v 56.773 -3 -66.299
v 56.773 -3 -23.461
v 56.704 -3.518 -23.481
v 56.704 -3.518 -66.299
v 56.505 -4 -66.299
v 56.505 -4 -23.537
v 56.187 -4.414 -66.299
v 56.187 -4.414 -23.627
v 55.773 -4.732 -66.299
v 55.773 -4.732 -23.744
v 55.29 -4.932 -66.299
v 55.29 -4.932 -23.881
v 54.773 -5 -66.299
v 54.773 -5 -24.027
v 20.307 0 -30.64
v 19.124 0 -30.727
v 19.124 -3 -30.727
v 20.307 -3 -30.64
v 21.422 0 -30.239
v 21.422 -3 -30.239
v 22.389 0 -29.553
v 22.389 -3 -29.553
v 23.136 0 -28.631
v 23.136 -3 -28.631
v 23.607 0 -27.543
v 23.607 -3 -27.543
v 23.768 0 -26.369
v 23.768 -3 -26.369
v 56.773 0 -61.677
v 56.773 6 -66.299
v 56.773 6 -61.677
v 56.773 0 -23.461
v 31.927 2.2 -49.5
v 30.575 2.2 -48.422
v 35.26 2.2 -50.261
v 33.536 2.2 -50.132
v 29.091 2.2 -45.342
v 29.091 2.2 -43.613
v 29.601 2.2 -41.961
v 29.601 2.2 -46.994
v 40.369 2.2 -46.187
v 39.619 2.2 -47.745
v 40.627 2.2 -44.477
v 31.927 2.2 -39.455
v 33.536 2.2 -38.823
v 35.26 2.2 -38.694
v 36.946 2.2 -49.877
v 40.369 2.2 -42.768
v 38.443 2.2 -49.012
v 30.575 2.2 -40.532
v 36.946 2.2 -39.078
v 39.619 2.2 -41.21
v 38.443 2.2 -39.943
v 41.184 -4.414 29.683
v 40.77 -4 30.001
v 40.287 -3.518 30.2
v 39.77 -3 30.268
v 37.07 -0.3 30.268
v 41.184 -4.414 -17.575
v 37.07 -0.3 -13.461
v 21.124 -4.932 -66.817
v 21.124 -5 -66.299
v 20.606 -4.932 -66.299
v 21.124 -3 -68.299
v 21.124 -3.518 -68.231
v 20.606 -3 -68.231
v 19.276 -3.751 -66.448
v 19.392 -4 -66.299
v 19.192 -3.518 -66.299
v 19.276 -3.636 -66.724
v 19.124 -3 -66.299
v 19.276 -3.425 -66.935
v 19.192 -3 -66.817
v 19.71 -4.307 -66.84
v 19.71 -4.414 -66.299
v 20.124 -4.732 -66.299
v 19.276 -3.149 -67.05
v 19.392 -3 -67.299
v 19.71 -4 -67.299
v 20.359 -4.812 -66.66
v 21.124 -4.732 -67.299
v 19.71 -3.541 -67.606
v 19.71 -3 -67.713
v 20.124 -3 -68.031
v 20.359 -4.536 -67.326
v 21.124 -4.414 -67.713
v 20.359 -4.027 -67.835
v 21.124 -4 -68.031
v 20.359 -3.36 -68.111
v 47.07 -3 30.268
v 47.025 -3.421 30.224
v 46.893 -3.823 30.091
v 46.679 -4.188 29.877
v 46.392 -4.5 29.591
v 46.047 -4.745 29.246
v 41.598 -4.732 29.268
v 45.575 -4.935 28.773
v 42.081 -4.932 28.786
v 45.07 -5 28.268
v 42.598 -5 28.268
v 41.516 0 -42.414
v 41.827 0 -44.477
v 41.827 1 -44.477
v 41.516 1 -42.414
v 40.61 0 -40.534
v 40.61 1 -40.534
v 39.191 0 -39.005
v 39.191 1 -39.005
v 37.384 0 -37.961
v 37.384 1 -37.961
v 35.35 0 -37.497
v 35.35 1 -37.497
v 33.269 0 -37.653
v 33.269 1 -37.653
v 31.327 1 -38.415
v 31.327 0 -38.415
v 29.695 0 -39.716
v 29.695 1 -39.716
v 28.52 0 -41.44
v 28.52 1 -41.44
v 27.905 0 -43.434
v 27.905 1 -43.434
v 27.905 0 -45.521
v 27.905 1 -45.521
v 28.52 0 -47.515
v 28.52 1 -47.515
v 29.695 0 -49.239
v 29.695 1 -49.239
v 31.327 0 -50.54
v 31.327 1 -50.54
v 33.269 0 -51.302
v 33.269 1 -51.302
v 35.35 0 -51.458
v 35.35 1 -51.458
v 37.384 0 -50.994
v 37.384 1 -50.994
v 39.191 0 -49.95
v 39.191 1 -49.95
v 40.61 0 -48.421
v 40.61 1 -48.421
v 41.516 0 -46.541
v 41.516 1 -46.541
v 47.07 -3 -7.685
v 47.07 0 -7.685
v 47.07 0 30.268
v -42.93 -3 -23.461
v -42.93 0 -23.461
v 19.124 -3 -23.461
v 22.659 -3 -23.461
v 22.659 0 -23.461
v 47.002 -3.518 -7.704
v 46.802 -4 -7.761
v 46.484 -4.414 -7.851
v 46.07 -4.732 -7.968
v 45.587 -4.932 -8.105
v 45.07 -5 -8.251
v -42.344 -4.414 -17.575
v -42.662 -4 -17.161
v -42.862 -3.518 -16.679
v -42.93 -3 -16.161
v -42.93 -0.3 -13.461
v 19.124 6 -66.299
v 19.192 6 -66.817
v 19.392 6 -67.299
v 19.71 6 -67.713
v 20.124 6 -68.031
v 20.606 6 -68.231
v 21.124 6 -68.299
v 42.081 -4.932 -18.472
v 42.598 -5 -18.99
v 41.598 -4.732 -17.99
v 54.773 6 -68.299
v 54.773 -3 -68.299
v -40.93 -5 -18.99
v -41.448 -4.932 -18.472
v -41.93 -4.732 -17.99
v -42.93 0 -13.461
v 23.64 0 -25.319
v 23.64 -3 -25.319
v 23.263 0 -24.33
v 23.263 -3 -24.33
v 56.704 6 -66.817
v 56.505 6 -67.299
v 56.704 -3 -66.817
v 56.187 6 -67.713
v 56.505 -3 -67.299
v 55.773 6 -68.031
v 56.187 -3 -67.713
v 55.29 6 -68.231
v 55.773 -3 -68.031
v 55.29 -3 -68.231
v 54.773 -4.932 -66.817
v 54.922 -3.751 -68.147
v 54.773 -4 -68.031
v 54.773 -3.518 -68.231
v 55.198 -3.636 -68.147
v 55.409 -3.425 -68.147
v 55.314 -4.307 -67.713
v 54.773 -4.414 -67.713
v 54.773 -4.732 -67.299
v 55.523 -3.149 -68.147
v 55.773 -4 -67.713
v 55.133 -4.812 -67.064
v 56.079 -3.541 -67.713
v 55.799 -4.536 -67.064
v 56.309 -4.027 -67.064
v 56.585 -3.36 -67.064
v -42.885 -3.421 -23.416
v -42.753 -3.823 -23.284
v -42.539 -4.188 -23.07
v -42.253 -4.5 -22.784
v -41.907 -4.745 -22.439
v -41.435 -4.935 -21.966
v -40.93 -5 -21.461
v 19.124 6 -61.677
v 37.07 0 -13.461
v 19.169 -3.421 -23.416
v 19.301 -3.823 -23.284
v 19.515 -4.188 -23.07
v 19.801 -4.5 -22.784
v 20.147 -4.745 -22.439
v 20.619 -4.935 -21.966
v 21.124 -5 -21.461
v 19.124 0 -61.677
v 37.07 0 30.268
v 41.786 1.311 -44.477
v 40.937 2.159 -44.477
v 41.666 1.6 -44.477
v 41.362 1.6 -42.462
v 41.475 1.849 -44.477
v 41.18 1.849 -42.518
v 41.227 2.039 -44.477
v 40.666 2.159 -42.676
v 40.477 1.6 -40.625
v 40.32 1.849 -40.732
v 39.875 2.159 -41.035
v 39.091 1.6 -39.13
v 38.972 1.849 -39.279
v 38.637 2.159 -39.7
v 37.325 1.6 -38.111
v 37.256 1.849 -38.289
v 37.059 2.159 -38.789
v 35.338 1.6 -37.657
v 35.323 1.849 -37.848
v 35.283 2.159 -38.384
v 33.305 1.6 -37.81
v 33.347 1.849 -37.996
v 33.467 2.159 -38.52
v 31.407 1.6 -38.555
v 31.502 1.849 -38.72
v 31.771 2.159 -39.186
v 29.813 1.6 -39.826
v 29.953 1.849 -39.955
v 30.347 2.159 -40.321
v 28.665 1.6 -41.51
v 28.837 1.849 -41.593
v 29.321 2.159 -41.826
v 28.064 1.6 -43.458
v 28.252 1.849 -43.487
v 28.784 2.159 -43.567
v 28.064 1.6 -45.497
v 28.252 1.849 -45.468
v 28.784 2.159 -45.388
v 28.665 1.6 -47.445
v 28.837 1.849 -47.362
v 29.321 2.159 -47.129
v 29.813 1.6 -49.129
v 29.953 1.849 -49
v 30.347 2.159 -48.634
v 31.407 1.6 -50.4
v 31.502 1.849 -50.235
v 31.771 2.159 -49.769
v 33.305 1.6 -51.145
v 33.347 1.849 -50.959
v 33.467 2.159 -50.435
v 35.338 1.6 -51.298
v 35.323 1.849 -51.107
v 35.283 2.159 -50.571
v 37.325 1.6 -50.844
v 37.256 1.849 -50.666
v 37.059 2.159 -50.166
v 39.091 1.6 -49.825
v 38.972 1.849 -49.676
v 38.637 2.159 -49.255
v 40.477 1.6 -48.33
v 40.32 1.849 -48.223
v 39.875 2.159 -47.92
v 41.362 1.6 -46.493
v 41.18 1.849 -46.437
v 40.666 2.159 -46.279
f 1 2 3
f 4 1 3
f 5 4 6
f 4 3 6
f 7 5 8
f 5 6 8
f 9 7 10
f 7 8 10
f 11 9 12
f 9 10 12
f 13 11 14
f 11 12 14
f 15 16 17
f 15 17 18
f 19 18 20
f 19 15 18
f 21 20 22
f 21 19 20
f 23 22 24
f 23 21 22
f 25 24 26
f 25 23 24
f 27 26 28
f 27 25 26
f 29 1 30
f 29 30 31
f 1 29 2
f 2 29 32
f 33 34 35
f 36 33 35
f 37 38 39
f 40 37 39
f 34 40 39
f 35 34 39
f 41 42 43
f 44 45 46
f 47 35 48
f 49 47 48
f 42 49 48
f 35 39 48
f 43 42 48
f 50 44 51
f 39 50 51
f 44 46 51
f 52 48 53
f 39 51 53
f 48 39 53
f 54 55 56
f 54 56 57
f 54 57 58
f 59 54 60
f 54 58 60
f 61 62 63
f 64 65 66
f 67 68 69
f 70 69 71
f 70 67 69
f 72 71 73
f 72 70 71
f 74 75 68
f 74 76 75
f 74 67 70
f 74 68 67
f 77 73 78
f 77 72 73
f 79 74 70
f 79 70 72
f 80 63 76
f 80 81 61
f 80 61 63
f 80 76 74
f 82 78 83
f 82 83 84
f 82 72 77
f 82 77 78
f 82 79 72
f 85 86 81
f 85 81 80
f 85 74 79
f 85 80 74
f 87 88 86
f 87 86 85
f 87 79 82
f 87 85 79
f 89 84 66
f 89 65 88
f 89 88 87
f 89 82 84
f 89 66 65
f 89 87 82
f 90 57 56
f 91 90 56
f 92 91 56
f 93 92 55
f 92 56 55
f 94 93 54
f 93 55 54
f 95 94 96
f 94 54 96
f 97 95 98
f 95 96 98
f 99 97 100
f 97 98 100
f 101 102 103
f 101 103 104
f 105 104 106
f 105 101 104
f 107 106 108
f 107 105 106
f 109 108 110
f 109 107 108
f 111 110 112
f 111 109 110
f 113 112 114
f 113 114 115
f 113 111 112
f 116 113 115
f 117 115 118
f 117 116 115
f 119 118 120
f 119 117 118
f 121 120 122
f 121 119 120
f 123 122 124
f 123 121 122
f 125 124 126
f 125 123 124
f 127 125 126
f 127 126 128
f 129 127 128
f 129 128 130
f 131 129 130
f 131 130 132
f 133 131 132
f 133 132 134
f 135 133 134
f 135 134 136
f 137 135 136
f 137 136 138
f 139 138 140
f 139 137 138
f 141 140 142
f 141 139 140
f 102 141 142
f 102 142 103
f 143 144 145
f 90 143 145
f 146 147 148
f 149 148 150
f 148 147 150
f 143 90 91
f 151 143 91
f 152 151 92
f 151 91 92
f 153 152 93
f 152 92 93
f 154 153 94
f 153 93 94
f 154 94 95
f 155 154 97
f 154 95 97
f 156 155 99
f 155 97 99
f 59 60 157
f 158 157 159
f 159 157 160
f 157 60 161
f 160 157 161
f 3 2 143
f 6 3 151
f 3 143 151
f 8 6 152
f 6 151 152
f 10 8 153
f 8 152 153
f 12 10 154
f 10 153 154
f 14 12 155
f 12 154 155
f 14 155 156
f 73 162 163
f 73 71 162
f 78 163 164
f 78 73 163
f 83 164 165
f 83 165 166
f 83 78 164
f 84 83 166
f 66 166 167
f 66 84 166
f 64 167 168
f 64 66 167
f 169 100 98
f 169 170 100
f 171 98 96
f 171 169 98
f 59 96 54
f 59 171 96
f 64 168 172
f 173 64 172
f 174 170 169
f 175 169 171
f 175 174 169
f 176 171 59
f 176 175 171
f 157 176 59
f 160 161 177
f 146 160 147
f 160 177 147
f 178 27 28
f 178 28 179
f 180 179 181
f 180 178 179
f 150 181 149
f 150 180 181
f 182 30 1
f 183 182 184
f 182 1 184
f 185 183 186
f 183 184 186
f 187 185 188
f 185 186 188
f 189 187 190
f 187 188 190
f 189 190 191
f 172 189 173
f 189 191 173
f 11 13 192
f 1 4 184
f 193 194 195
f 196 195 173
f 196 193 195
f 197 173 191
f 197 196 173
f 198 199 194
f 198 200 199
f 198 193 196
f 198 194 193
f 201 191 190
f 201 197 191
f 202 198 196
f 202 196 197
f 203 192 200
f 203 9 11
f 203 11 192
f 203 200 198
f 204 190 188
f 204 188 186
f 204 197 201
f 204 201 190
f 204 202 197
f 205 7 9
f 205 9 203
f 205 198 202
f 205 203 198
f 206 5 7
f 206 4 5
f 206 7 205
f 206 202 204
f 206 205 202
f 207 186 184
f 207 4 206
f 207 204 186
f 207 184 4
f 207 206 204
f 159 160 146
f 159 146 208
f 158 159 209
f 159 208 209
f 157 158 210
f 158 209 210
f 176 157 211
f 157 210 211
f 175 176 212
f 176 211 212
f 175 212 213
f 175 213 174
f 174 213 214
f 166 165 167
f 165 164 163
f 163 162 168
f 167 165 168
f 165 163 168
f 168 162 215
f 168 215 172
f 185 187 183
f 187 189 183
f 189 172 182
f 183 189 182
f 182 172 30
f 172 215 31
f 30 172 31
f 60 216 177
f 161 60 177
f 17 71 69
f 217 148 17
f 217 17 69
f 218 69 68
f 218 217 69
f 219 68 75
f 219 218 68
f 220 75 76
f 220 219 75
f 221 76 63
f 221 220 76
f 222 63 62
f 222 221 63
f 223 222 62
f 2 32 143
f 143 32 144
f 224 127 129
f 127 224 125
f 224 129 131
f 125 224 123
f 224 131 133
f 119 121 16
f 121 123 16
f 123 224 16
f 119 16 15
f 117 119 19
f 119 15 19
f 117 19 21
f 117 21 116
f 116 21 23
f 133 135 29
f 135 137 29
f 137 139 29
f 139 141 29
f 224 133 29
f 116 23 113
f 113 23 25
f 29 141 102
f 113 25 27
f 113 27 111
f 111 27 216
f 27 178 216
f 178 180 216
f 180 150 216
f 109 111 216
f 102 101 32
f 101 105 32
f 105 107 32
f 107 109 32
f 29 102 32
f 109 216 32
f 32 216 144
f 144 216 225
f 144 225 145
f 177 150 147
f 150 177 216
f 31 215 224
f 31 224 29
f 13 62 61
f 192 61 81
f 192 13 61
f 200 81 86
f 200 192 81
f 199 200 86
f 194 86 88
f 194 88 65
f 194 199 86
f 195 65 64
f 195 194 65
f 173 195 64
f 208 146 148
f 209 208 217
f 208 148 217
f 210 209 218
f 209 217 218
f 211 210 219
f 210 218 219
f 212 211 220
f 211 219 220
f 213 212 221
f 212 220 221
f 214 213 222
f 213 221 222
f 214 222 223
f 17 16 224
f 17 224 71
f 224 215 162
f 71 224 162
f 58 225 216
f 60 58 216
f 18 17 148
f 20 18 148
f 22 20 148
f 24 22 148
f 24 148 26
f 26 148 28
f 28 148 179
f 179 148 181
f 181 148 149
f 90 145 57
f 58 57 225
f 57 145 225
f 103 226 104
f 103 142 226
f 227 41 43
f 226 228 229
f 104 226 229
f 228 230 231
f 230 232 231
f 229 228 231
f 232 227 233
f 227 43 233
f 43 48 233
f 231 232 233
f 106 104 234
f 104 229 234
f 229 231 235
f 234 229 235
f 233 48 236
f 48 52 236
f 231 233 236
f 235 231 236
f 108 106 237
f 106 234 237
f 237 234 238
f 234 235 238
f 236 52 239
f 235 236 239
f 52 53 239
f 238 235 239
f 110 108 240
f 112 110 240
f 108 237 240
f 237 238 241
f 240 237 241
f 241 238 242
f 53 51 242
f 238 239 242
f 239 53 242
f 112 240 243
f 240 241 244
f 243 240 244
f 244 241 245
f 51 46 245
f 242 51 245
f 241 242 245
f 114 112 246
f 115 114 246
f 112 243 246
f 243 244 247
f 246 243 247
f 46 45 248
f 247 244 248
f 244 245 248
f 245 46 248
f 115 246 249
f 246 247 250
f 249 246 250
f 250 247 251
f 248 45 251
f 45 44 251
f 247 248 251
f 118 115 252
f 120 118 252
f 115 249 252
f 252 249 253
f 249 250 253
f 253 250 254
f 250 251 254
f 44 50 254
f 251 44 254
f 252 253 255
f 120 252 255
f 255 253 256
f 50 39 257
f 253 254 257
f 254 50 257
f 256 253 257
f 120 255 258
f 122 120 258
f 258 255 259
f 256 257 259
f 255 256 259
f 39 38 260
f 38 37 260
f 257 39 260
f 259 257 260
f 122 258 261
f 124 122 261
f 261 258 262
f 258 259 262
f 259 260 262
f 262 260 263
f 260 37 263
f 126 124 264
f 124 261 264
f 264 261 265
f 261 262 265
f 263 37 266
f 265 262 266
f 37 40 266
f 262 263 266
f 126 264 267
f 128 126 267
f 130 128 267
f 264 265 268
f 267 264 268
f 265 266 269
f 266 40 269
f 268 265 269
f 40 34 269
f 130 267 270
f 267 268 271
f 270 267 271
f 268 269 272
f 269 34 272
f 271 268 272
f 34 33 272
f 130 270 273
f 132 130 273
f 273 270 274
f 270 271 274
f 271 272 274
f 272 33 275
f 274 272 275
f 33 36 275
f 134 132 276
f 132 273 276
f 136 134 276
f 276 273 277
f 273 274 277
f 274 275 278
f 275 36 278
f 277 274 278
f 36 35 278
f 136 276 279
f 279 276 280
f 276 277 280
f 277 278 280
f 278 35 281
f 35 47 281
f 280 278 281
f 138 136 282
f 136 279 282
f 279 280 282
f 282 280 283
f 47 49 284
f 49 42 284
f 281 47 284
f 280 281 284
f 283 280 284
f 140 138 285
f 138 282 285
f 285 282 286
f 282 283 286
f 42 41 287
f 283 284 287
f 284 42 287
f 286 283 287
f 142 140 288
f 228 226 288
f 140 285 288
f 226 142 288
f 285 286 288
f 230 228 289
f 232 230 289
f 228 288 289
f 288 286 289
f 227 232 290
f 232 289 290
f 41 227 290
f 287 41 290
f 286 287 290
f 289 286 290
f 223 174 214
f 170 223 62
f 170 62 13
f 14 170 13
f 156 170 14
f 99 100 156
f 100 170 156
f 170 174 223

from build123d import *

# Parameters (mm, degrees)
F0_W          = 37.648660762
F0_H          = 6.6216221157
F1_DEPTH      = 6
F1_DEPTH_BACK = 5
F0_R          = 7
F2_DEPTH      = 5
F3_DEPTH      = 2.2
F4_SIZE       = 4.7
F5_R          = 1.2
F6_R          = 2
F8_DEPTH      = 2
F8_DEPTH_BACK = 3


with BuildPart() as f1:
    # F0 (on Front) → F1 (new body, two sides)
    with BuildSketch(Plane.XZ) as f1_sk:
        with Locations((37.9482610798, -64.9883002128)):
            Rectangle(F0_W, F0_H)
    extrude(amount=-F1_DEPTH)
    extrude(f1_sk.sketch, amount=F1_DEPTH_BACK)

    # F0 (on Front) → F2 (join)
    with BuildSketch(Plane.XZ):
        Polygon((19.1239306988, -23.4612585763), (19.1239306988, -61.677489155), (56.7725914607, -61.677489155), (56.7725914607, -23.4612585763), (47.0698534062, -23.4612585763), (37.0698534062, -23.4612585763), align=None)
        with Locations((34.8266364816, -44.477489155)):
            Circle(F0_R, mode=Mode.SUBTRACT)
        Polygon((-42.9301465938, -23.4612585763), (19.1239306988, -23.4612585763), (37.0698534062, -23.4612585763), (37.0698534062, -13.4612585763), (-42.9301465938, -13.4612585763), align=None)
        Polygon((37.0698534062, -13.4612585763), (37.0698534062, -23.4612585763), (47.0698534062, -23.4612585763), (47.0698534062, -7.6851719059), (47.0698534062, 30.268489238), (37.0698534062, 30.268489238), align=None)
        with Locations((34.8266364816, -44.477489155)):
            Circle(F0_R)
        Polygon((47.0698534062, -23.4612585763), (56.7725914607, -23.4612585763), (47.0698534062, -7.6851719059), align=None)
    extrude(amount=F2_DEPTH)

    # F0 (on Front) → F3 (join)
    with BuildSketch(Plane.XZ):
        with Locations((34.8266364816, -44.477489155)):
            Circle(F0_R)
    extrude(amount=-F3_DEPTH)

    # F4
    f4_edges = [f1.edges().sort_by_distance(p)[0] for p in [
        (-2.930147, -5, -13.461259),
        (37.069853, -5, 8.403615),
    ]]
    chamfer(f4_edges, length=F4_SIZE)

    # F5
    f5_edges = [f1.edges().sort_by_distance(p)[0] for p in [
        (27.826636, 2.2, -44.477489),
    ]]
    fillet(f5_edges, radius=F5_R)

    # F6
    f6_edges = [f1.edges().sort_by_distance(p)[0] for p in [
        (51.921222, -5, -15.573215),
        (47.069853, -5, 11.291659),
        (56.772591, -5, -45.880185),
        (37.948261, -5, -68.299111),
        (44.419853, -5, 30.268489),
        (41.769853, -5, 6.053615),
        (-0.580147, -5, -18.161259),
        (-42.930147, -5, -20.811259),
        (-11.903108, -5, -23.461259),
        (19.123931, -5, -45.880185),
        (19.123931, 0.5, -68.299111),
        (56.772591, 0.5, -68.299111),
    ]]
    fillet(f6_edges, radius=F6_R)

    # F7 (on face) → F8 (cut, two sides)
    with BuildSketch(Plane.XZ) as f8_sk:
        with BuildLine():
            ThreePointArc((19.1239306988, -30.7265526876), (22.3891362533, -29.5527672873), (23.7676569653, -26.3685844839))
            ThreePointArc((23.7676569653, -26.3685844839), (23.4811232341, -24.8128381171), (22.6591250093, -23.4612585763))
            Line((22.6591250093, -23.4612585763), (19.1239306988, -23.4612585763))
            Line((19.1239306988, -23.4612585763), (19.1239306988, -30.7265526876))
        make_face()
    extrude(amount=-F8_DEPTH, mode=Mode.SUBTRACT)
    extrude(f8_sk.sketch, amount=F8_DEPTH_BACK, mode=Mode.SUBTRACT)


solid = f1.part
